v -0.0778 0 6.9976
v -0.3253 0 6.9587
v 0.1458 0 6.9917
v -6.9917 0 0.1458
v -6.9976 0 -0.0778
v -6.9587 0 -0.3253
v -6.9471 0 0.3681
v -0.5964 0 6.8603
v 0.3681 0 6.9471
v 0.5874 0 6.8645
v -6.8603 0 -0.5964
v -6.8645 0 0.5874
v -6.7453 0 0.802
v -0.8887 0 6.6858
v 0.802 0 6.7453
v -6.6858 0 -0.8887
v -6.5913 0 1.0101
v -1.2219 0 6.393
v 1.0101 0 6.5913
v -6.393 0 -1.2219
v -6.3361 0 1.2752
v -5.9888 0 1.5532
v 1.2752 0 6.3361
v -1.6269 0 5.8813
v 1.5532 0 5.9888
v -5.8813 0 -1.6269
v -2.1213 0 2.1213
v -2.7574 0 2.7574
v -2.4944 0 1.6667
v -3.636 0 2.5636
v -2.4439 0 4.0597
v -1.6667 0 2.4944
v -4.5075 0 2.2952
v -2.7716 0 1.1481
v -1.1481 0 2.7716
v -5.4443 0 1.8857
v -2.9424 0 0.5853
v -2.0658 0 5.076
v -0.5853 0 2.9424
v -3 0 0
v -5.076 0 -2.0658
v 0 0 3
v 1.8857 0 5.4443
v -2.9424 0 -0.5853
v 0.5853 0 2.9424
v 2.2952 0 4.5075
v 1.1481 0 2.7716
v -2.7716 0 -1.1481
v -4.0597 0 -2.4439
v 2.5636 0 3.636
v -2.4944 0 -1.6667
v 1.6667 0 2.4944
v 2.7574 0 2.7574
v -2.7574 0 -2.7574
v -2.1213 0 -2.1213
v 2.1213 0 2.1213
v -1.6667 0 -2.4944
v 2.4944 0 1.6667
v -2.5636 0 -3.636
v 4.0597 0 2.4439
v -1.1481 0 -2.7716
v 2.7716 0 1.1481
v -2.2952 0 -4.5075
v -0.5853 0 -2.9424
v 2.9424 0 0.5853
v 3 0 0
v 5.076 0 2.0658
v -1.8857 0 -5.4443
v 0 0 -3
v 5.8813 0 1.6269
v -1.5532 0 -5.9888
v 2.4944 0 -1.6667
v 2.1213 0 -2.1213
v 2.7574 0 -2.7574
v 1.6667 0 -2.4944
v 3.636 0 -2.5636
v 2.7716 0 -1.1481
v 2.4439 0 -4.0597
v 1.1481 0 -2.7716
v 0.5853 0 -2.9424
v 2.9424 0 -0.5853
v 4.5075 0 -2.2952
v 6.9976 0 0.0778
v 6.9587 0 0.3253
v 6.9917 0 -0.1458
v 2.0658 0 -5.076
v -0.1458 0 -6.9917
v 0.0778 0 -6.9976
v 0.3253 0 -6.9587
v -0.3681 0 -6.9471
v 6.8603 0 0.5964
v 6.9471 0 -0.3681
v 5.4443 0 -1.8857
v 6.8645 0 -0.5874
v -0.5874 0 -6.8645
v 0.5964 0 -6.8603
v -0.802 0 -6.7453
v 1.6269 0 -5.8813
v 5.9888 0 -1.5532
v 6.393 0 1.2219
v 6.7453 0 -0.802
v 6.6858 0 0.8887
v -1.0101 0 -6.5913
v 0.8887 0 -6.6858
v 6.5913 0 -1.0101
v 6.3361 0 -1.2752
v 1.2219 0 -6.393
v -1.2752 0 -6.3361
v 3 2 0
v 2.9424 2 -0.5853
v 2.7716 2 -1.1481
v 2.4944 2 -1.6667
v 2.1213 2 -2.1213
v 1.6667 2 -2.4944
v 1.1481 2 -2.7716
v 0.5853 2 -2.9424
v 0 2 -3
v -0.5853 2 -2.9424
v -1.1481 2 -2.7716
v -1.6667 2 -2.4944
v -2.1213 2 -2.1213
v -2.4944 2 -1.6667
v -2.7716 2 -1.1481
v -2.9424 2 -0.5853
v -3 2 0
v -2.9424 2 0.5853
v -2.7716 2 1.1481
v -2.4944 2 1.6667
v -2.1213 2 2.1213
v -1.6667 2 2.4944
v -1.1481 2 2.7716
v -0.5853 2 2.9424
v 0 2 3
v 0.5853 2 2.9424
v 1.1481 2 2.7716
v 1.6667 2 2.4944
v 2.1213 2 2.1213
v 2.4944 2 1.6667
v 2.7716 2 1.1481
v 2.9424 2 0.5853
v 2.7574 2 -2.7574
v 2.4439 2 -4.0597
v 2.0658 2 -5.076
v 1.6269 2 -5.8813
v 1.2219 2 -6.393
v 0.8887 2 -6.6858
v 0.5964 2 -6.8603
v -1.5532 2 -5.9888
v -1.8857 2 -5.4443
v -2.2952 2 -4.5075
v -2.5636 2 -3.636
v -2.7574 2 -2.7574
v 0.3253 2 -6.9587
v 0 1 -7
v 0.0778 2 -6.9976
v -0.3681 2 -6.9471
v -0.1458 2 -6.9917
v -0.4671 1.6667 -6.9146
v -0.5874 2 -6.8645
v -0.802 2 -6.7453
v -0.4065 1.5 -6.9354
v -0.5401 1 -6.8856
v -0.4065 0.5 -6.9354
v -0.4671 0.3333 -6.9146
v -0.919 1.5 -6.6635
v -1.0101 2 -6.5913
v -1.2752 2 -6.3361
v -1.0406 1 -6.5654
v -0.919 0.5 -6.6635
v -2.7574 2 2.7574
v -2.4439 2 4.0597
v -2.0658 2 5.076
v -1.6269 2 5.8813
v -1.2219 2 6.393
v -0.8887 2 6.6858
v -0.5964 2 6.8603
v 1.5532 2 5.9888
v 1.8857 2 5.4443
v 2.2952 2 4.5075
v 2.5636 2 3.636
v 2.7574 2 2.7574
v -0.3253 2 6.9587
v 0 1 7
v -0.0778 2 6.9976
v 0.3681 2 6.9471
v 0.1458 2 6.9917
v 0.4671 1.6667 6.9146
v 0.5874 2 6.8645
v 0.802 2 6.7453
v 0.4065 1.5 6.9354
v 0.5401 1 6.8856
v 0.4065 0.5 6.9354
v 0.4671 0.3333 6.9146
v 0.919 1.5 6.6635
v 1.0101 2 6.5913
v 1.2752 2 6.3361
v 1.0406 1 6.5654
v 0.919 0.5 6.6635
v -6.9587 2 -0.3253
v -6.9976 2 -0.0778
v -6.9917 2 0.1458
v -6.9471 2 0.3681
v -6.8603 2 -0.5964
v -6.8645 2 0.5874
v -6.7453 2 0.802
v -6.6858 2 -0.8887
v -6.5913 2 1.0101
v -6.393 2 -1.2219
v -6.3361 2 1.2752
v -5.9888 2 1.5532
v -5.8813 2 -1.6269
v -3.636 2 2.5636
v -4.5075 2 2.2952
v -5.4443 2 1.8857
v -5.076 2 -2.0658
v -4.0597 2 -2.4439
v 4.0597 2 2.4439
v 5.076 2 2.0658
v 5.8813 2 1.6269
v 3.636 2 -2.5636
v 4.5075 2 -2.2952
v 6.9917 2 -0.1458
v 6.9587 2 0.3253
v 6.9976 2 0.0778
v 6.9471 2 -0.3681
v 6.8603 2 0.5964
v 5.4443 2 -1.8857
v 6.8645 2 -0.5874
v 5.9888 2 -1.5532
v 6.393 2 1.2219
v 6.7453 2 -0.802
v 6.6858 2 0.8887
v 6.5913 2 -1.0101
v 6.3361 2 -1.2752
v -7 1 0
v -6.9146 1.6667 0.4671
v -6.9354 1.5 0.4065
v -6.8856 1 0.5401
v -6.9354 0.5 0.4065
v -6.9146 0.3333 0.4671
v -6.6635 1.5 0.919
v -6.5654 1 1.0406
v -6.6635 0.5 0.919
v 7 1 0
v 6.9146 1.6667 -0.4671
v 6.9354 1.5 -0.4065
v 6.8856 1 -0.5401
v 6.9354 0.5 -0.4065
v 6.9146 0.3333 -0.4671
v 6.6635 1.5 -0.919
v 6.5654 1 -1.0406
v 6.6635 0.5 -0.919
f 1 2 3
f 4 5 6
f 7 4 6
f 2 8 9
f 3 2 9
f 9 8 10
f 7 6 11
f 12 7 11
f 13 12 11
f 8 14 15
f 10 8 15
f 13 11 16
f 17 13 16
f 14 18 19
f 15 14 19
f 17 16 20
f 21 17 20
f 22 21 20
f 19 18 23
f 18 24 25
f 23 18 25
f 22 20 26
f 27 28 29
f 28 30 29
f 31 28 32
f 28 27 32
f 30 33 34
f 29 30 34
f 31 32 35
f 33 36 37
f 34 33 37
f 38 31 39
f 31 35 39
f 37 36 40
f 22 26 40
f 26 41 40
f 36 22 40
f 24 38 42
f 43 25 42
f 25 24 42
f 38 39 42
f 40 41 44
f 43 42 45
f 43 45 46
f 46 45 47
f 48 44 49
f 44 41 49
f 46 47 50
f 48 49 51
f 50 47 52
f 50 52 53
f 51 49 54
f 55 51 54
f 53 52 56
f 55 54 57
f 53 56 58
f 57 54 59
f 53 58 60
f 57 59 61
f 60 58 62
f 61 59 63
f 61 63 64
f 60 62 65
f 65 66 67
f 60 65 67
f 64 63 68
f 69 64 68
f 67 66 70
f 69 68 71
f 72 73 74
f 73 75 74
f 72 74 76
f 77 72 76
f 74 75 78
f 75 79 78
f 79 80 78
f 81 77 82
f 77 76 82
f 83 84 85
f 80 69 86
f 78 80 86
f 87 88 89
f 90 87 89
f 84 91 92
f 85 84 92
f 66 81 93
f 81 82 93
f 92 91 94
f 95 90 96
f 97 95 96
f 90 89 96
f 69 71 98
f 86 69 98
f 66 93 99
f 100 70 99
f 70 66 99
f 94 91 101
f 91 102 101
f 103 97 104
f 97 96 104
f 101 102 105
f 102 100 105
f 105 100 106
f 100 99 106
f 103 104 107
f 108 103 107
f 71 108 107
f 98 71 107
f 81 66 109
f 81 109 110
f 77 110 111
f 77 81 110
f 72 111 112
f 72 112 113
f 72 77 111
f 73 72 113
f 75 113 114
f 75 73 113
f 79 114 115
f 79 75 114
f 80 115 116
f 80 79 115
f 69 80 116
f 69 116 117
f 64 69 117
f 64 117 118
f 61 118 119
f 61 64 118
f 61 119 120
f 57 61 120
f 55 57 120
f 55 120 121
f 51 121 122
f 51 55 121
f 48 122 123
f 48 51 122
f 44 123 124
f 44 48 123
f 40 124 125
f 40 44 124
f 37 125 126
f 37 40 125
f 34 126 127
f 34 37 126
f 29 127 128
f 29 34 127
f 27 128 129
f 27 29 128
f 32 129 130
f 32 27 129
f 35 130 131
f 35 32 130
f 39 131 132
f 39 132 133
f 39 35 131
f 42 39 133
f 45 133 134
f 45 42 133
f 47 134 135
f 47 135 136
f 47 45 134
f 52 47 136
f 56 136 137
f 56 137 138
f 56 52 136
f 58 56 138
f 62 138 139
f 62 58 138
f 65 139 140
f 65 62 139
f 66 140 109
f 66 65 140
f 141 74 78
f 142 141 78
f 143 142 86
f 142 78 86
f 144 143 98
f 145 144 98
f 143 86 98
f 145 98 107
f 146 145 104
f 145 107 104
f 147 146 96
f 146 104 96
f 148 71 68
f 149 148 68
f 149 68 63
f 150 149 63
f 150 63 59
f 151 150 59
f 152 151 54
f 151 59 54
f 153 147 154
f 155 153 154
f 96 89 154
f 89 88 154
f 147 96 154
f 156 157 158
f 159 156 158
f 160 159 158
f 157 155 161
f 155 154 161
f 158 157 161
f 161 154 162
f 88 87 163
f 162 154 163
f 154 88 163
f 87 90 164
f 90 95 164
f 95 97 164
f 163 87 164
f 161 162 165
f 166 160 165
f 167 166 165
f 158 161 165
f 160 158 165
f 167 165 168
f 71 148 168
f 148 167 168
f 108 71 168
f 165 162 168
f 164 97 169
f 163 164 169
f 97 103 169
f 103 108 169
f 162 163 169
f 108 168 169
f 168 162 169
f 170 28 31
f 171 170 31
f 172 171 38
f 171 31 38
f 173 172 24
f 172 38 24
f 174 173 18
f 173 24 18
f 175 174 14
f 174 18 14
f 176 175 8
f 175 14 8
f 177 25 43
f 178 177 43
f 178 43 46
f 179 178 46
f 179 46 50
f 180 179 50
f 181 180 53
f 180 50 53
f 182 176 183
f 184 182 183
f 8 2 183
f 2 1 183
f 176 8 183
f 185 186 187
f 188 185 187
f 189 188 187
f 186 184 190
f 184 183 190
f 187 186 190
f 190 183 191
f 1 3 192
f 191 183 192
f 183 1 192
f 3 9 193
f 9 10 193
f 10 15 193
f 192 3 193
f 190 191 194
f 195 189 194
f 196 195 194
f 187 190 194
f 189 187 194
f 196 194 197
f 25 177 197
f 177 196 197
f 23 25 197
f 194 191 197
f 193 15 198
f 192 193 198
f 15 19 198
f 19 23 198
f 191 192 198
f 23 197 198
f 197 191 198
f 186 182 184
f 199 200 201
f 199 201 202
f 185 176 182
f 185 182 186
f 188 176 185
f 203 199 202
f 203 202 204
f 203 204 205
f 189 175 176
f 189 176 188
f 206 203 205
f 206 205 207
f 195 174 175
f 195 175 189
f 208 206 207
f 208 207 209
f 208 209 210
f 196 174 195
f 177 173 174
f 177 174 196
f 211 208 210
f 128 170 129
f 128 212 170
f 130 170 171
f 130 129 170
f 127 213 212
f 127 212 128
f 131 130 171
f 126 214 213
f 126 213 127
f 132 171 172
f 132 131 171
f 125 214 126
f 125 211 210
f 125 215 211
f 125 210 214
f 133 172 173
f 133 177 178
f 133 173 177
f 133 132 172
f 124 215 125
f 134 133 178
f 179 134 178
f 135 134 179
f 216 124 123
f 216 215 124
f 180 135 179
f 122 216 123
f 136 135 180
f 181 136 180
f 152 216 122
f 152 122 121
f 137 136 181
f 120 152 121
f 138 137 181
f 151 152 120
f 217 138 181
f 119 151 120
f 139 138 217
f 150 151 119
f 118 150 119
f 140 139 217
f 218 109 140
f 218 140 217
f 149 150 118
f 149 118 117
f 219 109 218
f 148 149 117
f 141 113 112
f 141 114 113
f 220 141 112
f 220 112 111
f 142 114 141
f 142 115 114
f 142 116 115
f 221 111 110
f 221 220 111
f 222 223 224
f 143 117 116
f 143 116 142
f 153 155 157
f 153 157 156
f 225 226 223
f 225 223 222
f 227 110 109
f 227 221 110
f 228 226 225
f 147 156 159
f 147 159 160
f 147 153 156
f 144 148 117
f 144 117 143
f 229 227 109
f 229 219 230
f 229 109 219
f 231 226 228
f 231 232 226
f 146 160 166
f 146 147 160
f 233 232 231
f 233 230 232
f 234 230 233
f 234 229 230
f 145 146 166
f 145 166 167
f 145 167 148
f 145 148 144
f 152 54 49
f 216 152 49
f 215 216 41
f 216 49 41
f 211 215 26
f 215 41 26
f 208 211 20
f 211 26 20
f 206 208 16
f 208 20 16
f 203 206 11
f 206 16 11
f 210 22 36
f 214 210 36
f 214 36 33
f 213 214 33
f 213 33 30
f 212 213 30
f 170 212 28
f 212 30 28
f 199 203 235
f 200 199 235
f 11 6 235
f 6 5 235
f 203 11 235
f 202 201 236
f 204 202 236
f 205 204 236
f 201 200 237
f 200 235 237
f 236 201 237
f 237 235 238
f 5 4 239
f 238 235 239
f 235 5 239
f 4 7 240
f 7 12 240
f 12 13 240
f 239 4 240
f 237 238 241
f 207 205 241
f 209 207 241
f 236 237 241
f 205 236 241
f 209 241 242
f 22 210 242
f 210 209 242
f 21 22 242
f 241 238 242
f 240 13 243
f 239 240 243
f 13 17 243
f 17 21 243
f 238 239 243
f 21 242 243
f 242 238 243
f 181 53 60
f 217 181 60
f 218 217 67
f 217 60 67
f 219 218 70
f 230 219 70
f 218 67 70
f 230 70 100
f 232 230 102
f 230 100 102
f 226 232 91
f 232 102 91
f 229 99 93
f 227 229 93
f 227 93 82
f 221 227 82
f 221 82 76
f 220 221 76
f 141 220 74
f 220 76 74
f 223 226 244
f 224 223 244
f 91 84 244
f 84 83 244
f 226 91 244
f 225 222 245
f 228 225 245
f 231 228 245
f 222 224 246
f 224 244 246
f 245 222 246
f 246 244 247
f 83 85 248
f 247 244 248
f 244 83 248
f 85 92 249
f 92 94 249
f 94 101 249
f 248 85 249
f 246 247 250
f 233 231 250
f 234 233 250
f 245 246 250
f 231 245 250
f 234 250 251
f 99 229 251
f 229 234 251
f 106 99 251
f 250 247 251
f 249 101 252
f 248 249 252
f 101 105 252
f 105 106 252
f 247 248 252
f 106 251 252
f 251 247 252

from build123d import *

# Parameters (mm, degrees)
SKETCH1_R           = 3
BOSS_EXTRUDE1_DEPTH = 2


with BuildPart() as part:
    # Sketch1 → Boss-Extrude1 (new body)
    with BuildSketch(Plane(origin=(0, 0, 0), x_dir=(1, 0, 0), z_dir=(0, 1, 0))):
        with BuildLine():
            add(Edge.make_bspline(
                [(-2.75743509, -2.75743509), (0, -17.770137247), (2.75743509, -2.75743509)],
                knots=[1.975688113, 1.975688113, 1.975688113, 4.307497194, 4.307497194, 4.307497194], degree=2, weights=[1, 0.393919299, 1]))
            add(Edge.make_bspline(
                [(2.75743509, -2.75743509), (17.770137247, 0), (2.75743509, 2.75743509)],
                knots=[5.117280767, 5.117280767, 5.117280767, 7.449089848, 7.449089848, 7.449089848], degree=2, weights=[1, 0.393919299, 1]))
            add(Edge.make_bspline(
                [(2.75743509, 2.75743509), (0, 17.770137247), (-2.75743509, 2.75743509)],
                knots=[5.117280767, 5.117280767, 5.117280767, 7.449089848, 7.449089848, 7.449089848], degree=2, weights=[1, 0.393919299, 1]))
            add(Edge.make_bspline(
                [(-2.75743509, 2.75743509), (-17.770137247, 0), (-2.75743509, -2.75743509)],
                knots=[1.975688113, 1.975688113, 1.975688113, 4.307497194, 4.307497194, 4.307497194], degree=2, weights=[1, 0.393919299, 1]))
        make_face()
        Circle(SKETCH1_R, mode=Mode.SUBTRACT)
    extrude(amount=BOSS_EXTRUDE1_DEPTH)


solid = part.part
